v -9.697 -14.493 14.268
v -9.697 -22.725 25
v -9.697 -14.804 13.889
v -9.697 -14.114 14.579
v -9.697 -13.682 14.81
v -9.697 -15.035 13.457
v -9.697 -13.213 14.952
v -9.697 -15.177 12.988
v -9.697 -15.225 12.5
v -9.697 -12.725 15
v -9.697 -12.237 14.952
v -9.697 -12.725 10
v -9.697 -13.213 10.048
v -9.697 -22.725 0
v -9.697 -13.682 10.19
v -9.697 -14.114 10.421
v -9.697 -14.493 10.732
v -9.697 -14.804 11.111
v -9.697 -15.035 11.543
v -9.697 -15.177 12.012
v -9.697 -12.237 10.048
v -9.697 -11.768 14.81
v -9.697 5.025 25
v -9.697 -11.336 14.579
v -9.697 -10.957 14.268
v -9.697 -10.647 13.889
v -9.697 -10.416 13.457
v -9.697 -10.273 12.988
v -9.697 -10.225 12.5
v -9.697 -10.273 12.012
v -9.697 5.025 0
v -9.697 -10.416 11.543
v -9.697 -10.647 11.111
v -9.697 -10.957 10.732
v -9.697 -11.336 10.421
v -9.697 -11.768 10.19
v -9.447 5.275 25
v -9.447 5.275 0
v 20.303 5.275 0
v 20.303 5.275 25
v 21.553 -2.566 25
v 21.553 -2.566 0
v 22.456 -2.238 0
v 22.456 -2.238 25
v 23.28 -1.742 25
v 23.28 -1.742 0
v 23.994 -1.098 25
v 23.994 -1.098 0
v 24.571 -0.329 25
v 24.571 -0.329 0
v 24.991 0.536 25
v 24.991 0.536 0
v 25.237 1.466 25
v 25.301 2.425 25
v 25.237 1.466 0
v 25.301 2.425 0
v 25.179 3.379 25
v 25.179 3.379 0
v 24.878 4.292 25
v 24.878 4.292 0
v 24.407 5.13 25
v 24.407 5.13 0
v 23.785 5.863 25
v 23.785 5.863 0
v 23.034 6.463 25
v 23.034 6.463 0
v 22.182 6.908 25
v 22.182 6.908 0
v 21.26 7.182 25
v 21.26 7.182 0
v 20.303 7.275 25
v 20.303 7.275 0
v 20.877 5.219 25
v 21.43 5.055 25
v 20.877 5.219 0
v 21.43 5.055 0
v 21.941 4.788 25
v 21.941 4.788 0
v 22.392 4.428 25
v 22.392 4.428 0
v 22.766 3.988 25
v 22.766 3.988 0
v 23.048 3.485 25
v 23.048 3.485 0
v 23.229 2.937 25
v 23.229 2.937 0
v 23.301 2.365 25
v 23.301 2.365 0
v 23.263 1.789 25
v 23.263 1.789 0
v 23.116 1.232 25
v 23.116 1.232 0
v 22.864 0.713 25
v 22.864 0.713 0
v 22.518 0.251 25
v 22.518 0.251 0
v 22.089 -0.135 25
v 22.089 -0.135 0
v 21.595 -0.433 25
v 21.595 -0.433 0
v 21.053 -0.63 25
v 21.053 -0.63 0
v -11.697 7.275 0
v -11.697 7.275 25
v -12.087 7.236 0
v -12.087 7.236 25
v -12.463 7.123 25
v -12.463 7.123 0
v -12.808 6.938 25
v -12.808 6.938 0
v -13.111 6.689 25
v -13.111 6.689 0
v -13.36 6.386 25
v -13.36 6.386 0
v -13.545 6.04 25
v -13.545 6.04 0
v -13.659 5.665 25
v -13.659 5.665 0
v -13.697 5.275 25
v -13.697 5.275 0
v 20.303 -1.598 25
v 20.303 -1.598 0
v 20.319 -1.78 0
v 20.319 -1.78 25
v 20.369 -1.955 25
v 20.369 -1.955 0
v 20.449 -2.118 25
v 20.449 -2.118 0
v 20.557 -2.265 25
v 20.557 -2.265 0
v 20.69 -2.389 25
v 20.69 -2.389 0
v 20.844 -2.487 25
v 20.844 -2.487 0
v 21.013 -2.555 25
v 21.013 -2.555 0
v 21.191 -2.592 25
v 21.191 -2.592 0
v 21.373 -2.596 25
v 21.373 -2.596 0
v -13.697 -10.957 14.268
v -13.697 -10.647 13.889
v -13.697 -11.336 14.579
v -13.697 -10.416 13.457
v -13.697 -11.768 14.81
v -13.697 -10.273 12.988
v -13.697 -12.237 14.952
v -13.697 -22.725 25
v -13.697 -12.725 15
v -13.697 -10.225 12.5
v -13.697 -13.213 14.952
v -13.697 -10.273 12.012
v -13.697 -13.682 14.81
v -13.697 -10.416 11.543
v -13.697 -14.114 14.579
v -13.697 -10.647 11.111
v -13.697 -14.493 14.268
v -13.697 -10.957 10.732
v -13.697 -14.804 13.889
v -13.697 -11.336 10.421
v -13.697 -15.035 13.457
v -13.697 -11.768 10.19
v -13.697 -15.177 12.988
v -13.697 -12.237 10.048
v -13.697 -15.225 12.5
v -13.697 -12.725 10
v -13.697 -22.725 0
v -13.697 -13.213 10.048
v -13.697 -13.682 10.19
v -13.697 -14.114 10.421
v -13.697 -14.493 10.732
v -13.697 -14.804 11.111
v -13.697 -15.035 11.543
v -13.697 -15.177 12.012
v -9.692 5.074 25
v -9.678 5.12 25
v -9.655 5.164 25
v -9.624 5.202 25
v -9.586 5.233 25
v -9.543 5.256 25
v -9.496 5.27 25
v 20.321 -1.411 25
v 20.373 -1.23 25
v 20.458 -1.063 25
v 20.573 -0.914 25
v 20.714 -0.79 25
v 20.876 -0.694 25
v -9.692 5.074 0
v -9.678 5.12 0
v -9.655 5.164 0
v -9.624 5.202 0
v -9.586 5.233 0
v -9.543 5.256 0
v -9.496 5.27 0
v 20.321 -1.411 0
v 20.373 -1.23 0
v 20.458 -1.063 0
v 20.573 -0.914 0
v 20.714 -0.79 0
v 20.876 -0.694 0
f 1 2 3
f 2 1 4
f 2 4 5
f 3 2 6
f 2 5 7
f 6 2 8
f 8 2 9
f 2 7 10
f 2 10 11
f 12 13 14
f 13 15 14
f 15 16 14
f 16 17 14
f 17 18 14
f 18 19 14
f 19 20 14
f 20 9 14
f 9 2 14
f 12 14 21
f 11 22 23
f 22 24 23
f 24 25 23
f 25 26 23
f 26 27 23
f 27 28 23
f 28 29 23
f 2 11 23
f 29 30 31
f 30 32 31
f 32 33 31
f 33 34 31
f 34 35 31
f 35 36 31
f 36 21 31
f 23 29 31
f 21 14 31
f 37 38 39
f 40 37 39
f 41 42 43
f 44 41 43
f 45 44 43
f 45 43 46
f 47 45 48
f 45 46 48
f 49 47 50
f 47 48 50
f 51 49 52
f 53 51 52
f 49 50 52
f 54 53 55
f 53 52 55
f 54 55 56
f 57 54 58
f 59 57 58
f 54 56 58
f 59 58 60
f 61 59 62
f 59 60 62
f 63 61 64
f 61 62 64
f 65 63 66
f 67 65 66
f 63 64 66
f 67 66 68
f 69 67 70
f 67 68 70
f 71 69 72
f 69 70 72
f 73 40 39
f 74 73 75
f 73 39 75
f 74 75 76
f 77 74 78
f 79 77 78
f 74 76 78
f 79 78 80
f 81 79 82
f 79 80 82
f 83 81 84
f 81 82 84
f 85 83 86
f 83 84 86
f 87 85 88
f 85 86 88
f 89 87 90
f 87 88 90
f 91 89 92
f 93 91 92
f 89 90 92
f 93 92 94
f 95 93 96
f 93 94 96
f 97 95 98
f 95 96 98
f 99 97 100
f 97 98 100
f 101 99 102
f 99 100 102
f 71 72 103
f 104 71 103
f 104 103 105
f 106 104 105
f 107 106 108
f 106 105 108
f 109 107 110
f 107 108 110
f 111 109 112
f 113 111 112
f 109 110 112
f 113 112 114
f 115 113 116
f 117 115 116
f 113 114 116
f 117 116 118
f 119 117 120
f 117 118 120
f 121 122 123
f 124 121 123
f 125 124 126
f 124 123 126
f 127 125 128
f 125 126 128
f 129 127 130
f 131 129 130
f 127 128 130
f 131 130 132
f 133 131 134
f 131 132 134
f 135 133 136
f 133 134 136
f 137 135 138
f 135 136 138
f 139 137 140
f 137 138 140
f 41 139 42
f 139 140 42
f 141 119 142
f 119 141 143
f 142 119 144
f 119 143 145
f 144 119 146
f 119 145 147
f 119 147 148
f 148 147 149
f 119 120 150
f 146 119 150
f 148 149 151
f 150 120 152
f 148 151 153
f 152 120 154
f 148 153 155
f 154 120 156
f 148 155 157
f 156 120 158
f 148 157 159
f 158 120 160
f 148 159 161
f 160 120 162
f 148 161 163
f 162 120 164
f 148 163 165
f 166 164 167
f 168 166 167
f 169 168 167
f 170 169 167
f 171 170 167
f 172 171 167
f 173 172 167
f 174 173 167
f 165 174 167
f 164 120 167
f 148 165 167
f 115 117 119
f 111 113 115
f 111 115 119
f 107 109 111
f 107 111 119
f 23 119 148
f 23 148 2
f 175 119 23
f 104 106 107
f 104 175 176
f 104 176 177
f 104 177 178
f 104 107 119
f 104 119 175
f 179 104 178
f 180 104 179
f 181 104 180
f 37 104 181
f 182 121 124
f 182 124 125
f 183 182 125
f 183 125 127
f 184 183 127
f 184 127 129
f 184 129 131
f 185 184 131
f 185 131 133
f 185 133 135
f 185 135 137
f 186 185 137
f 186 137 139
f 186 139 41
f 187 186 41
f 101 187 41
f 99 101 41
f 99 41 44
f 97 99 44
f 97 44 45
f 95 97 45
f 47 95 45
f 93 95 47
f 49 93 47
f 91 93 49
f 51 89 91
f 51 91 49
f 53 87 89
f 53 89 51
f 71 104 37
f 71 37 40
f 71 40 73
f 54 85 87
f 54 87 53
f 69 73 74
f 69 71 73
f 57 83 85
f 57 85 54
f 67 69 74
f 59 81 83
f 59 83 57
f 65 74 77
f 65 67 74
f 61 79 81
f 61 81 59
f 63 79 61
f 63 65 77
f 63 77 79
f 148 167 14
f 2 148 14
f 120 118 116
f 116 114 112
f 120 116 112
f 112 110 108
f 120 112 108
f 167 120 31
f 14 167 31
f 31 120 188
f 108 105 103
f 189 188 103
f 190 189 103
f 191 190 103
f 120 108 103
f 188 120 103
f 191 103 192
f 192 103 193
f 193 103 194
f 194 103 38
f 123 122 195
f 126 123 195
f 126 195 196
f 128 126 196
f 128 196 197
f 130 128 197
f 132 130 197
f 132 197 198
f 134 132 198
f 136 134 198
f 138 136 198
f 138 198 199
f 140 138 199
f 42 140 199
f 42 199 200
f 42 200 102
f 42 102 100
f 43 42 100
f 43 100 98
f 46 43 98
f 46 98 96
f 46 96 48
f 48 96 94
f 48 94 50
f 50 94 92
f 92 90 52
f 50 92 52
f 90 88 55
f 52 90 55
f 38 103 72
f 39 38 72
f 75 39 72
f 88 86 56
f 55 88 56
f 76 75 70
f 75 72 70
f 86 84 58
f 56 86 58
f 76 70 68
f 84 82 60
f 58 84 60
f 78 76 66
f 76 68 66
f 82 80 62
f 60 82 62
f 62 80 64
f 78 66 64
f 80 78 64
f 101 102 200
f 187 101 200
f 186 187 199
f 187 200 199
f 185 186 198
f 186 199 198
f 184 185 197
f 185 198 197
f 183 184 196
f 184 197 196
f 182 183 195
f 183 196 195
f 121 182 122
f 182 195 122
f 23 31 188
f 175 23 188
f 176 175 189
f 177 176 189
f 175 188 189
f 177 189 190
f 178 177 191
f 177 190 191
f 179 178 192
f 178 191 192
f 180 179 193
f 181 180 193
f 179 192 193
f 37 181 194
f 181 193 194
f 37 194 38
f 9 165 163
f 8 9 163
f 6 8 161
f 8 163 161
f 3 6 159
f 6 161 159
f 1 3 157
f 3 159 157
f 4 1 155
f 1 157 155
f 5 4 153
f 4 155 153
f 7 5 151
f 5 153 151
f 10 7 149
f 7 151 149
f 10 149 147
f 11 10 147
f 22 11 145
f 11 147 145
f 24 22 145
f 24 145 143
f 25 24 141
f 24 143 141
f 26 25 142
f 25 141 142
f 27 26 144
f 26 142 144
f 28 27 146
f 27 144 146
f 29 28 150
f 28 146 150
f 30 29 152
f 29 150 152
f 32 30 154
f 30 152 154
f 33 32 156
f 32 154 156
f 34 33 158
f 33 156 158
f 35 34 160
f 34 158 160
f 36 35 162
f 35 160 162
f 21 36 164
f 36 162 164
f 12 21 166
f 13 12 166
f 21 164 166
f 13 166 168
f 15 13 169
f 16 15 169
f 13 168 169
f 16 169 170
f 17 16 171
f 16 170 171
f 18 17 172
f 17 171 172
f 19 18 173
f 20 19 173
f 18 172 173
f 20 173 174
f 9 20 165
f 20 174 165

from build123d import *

# Parameters (mm, degrees)
F1_DEPTH = 25
F2_R     = 2.5
F3_DEPTH = 4


with BuildPart() as f1:
    # F0 (on Top) → F1 (new body)
    with BuildSketch(Plane.XY):
        with BuildLine():
            Line((-9.697168, 7.274801), (-11.697168, 7.274801))
            ThreePointArc((-11.697168, 7.274801), (-13.111381, 6.689015), (-13.697168, 5.274801))
            Line((-13.697168, 5.274801), (-13.697168, -22.725199))
            Line((-13.697168, -22.725199), (-9.697168, -22.725199))
            Line((-9.697168, -22.725199), (-9.697168, 5.024801))
            ThreePointArc((-9.697168, 5.024801), (-9.623944, 5.201578), (-9.447168, 5.274801))
            Line((-9.447168, 5.274801), (20.302832, 5.274801))
            ThreePointArc((20.302832, 5.274801), (23.278921, 2.652814), (21.052832, -0.629937))
            ThreePointArc((21.052832, -0.629937), (20.512263, -0.98581), (20.302832, -1.598182))
            ThreePointArc((20.302832, -1.598182), (20.69046, -2.388752), (21.552832, -2.566428))
            ThreePointArc((21.552832, -2.566428), (25.262981, 2.904822), (20.302832, 7.274801))
            Line((20.302832, 7.274801), (-9.697168, 7.274801))
        make_face()
    extrude(amount=F1_DEPTH)

    # F2 (on face) → F3 (cut, through all)
    with BuildSketch(Plane(origin=(-13.697168, 0, 0), x_dir=(0, -1, 0), z_dir=(-1, 0, 0))):
        with Locations((12.725199, 12.5)):
            Circle(F2_R)
    extrude(amount=-F3_DEPTH, mode=Mode.SUBTRACT)


solid = f1.part
